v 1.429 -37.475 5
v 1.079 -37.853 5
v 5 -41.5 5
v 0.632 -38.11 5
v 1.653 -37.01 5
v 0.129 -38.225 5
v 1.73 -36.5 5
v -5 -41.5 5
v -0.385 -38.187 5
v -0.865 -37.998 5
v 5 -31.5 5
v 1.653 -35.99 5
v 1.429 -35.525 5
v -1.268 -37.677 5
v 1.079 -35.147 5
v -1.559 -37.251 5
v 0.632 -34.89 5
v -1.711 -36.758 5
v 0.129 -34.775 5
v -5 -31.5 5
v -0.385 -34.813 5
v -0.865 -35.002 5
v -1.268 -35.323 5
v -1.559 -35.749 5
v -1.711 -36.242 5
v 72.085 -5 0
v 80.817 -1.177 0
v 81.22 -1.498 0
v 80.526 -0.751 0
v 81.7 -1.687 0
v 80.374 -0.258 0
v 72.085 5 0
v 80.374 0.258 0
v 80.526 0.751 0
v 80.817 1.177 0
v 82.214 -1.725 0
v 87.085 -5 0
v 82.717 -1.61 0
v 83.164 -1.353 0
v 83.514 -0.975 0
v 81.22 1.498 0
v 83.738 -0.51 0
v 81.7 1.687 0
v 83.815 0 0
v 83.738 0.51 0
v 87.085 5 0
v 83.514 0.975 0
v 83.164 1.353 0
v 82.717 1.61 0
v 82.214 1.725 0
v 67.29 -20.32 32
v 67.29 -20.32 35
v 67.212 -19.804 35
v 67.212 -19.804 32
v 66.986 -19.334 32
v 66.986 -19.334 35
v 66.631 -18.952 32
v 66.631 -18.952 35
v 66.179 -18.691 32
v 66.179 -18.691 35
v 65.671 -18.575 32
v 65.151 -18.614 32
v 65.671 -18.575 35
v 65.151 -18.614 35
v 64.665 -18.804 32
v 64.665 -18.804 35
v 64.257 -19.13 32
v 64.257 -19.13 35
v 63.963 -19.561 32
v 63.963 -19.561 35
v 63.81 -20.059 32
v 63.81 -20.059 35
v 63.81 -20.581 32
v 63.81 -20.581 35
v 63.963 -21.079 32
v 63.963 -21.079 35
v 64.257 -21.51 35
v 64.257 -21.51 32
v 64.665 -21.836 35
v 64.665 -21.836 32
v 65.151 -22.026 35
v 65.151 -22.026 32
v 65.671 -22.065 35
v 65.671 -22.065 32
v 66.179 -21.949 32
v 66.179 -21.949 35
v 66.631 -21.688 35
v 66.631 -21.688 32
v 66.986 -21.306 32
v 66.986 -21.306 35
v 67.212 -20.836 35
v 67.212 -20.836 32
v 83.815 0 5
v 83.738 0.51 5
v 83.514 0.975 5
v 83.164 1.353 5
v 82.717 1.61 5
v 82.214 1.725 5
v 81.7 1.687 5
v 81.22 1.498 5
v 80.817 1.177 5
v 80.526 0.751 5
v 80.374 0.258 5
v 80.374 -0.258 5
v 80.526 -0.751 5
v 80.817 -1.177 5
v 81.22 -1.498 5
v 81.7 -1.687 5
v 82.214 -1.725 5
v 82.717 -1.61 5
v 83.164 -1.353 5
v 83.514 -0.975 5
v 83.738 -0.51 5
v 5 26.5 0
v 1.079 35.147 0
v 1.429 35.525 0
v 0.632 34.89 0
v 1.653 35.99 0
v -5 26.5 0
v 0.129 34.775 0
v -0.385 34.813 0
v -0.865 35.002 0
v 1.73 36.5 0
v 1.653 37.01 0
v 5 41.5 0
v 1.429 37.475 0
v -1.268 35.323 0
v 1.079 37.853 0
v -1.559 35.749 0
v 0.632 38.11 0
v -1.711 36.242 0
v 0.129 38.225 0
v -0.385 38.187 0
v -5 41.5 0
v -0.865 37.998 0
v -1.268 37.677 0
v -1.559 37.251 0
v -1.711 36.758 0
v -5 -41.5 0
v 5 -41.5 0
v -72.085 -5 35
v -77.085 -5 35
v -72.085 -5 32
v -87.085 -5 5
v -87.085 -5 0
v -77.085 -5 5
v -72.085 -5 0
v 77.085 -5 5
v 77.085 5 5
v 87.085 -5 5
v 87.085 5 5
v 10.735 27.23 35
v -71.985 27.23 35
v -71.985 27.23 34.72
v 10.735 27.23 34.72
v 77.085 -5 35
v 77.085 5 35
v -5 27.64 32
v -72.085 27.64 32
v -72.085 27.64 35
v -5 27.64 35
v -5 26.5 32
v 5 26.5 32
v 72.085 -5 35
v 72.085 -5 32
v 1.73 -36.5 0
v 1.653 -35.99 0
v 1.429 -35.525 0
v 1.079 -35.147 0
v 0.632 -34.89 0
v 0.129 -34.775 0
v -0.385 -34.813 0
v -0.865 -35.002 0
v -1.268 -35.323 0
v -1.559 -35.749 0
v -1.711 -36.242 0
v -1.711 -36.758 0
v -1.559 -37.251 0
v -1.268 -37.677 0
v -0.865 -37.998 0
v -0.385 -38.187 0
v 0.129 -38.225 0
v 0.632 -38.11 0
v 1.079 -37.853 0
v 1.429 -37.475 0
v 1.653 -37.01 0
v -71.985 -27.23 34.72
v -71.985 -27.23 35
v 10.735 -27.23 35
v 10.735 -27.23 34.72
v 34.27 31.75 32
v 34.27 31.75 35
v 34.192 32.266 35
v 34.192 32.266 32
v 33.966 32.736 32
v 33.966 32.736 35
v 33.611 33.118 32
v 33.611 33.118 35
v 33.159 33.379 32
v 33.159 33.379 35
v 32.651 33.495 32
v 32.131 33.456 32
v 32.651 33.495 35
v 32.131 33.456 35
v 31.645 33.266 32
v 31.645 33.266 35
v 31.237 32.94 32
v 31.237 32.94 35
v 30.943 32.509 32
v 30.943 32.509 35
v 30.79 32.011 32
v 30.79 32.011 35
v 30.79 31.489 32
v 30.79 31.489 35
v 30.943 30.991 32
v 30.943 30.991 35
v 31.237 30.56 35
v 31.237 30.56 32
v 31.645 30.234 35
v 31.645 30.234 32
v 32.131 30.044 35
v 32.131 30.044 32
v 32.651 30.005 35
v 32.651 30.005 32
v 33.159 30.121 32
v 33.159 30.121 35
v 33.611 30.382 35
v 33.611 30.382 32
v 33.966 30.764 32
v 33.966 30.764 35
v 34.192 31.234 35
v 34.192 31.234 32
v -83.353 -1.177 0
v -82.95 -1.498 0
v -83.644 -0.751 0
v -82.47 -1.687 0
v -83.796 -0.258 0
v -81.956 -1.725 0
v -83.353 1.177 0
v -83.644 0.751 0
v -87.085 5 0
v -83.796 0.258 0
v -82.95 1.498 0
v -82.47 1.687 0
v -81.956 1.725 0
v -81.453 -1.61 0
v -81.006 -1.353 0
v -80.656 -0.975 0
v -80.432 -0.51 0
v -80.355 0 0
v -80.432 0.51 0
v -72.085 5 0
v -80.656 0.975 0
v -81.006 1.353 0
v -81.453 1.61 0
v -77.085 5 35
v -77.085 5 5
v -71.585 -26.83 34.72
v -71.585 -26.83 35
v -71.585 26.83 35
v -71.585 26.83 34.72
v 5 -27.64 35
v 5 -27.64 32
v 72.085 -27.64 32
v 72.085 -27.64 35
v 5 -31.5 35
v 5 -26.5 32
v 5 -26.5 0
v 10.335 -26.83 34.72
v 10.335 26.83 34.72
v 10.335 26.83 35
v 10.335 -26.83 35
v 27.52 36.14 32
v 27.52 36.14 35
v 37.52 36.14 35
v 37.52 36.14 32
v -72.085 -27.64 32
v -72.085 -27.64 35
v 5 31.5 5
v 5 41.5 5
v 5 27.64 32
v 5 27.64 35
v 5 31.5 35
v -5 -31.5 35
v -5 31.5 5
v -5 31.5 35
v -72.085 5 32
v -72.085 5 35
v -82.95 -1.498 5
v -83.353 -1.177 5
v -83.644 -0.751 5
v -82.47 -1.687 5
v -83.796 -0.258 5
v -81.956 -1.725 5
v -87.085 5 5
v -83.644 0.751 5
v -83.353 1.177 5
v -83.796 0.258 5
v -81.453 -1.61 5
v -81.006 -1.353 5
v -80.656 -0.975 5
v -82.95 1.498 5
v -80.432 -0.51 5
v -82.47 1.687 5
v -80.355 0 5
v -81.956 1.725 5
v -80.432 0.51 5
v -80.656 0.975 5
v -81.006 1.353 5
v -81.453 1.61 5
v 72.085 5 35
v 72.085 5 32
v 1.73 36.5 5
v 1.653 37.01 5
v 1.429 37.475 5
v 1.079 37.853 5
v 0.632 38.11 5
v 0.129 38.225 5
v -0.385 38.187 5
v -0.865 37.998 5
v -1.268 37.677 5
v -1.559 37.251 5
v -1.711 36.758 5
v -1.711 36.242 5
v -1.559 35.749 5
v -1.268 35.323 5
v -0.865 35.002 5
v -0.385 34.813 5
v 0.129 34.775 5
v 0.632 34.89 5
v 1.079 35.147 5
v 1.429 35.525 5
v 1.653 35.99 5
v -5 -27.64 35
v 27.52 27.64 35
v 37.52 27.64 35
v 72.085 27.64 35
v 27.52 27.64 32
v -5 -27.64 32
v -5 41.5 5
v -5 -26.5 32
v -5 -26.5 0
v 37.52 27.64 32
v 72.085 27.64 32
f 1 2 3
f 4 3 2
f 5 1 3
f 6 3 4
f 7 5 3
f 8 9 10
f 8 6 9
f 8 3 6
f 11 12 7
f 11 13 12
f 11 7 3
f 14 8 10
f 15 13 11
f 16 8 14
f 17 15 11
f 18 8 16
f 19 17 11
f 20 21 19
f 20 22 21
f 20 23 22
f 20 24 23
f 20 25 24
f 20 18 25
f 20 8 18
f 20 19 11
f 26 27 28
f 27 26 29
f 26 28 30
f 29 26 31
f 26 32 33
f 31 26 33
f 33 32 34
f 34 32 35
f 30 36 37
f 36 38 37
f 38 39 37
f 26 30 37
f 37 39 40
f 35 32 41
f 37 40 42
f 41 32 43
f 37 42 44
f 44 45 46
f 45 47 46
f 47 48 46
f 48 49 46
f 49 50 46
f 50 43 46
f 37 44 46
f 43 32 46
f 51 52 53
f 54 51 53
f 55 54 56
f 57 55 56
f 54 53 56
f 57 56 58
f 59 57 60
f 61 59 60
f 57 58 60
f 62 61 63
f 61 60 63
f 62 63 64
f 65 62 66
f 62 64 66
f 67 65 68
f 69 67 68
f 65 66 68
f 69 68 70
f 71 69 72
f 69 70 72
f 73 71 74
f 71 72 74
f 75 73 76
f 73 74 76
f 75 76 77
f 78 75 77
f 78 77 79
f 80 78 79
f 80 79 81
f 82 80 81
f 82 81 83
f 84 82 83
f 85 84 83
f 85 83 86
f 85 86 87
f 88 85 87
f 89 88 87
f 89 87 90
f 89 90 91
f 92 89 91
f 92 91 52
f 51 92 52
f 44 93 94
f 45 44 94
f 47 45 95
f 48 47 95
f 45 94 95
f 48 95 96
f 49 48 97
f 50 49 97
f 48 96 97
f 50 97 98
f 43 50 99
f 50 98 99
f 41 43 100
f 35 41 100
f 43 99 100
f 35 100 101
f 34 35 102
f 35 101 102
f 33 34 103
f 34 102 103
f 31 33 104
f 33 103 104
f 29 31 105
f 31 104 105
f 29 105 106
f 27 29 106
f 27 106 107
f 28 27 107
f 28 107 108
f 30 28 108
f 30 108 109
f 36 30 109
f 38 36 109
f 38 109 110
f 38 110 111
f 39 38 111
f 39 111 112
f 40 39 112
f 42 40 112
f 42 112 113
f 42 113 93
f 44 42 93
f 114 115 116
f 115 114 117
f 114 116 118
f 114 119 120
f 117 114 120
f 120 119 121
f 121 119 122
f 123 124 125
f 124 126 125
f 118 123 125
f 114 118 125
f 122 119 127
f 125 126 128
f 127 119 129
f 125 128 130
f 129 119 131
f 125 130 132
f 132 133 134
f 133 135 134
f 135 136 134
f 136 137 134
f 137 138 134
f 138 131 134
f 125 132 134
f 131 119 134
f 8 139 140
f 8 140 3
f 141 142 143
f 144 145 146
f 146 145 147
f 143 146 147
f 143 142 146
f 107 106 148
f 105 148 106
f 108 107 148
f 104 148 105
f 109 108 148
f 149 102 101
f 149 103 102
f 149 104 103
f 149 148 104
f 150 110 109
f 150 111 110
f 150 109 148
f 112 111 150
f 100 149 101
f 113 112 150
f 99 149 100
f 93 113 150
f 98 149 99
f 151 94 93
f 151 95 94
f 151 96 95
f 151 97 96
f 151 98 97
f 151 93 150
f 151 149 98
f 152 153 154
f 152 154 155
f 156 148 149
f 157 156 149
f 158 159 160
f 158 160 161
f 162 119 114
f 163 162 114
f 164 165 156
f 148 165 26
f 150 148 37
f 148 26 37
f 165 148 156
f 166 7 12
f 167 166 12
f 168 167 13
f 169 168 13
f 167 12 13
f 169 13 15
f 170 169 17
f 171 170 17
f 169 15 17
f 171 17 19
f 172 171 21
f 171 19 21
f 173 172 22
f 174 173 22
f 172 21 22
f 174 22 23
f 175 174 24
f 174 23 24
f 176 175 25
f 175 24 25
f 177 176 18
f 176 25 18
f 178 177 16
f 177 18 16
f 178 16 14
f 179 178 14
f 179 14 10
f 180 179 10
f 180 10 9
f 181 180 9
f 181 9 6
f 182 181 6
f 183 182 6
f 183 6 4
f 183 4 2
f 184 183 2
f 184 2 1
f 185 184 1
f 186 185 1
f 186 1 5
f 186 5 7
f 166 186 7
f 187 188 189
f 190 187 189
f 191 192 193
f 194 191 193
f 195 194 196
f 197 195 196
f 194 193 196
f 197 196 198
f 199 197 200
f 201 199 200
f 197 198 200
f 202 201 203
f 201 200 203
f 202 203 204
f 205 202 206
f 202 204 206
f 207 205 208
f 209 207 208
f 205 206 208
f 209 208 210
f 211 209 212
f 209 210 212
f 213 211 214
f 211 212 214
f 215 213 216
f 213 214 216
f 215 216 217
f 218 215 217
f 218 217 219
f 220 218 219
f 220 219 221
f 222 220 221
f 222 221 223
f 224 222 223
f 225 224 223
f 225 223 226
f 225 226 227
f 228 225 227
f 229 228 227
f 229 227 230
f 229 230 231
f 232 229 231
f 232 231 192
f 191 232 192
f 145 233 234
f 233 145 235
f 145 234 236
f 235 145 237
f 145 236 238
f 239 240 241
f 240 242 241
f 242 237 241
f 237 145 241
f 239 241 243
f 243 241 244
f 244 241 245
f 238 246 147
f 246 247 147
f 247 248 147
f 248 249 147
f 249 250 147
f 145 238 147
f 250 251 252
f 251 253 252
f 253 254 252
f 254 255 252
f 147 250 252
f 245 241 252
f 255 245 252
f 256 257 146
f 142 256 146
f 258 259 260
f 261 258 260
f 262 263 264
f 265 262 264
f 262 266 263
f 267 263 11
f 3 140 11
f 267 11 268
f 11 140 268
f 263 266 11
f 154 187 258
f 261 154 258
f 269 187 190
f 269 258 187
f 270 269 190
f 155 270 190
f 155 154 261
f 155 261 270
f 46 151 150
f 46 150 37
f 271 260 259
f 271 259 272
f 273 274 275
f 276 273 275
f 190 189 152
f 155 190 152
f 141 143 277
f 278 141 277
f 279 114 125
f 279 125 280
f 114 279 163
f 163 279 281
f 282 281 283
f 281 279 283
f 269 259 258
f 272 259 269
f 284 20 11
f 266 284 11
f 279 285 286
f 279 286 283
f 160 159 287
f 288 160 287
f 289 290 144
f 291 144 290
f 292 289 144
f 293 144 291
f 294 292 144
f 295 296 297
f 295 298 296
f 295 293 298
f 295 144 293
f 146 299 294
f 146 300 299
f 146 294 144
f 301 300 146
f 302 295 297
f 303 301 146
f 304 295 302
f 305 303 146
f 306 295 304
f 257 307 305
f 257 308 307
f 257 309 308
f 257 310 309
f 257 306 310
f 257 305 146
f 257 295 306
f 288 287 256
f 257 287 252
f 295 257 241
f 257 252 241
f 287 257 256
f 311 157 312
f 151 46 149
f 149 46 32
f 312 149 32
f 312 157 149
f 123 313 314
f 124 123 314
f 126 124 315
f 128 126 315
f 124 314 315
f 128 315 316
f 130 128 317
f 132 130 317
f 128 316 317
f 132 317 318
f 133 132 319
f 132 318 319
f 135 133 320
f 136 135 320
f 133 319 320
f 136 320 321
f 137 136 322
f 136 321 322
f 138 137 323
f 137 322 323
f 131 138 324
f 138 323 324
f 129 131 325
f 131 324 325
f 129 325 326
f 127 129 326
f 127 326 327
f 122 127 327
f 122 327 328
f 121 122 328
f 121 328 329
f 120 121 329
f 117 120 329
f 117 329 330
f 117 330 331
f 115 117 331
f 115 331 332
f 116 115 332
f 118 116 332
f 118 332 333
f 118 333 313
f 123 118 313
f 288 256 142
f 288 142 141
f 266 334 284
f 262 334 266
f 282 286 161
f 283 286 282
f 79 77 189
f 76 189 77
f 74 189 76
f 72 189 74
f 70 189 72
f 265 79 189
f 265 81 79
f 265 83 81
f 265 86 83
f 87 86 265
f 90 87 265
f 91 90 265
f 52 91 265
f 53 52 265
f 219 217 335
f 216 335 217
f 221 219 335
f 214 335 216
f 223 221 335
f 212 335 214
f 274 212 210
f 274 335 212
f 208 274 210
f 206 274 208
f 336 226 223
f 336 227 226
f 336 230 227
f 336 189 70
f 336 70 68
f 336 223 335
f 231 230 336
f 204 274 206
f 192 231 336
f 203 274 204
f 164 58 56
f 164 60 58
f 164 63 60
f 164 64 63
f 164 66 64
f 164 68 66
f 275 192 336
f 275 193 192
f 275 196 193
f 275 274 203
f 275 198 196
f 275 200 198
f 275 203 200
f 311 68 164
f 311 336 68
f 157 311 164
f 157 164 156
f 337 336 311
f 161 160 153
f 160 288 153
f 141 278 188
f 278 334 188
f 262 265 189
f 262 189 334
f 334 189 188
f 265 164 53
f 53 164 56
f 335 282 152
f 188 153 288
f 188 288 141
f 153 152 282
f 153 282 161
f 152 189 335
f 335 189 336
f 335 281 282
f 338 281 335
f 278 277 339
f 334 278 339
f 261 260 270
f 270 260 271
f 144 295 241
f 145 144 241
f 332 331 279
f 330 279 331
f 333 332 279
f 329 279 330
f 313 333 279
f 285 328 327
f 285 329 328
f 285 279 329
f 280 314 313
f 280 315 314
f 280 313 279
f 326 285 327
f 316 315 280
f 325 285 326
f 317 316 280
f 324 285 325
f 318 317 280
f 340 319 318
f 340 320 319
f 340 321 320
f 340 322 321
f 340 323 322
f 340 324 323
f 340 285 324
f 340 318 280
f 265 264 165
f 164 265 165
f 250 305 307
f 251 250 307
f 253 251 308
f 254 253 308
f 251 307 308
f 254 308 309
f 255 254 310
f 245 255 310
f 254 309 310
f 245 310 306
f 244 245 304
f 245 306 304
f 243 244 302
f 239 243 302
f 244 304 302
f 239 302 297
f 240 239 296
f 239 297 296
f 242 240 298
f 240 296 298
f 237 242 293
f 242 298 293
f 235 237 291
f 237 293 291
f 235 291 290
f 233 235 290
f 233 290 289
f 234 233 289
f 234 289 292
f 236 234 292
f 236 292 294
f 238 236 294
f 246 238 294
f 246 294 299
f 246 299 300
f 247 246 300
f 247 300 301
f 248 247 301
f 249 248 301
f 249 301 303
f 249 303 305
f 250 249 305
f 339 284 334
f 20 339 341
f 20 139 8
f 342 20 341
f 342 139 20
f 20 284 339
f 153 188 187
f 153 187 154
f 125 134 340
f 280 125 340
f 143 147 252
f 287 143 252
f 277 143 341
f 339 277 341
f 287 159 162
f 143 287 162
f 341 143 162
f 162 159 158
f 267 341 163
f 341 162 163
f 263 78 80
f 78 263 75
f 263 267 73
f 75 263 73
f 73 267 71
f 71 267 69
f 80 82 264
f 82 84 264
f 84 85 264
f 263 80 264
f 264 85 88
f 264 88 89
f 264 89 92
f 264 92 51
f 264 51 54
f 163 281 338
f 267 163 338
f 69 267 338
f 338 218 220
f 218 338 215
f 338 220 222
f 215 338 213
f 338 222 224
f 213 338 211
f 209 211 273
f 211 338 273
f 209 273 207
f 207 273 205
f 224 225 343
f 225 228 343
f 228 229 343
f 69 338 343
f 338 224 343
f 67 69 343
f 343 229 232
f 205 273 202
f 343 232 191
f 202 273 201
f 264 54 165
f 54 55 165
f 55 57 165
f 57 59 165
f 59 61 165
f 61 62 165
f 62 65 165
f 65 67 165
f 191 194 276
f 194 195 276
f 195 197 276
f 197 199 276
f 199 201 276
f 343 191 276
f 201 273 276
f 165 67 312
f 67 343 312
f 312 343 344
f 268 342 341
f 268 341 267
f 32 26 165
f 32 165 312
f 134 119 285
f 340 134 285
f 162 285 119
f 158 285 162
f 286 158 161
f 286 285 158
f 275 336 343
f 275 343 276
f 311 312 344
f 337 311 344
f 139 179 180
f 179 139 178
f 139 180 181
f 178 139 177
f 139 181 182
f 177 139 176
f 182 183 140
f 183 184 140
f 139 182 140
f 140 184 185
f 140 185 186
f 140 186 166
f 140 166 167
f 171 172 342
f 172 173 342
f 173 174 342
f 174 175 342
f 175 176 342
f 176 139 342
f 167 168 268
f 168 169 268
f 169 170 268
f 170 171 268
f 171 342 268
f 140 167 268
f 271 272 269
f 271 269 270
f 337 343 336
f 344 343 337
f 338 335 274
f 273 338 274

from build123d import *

# Parameters (mm, degrees)
SKETCH2_W             = 5
SKETCH2_H             = 10
BOSS_EXTRUDE1_DEPTH   = 32
SKETCH2_W_2           = 10
SKETCH2_H_2           = 5
BOSS_EXTRUDE1_2_DEPTH = 32
BOSS_EXTRUDE1_3_DEPTH = 32
BOSS_EXTRUDE1_4_DEPTH = 32
SKETCH3_W             = 165
SKETCH3_H             = 55.28
BOSS_EXTRUDE2_DEPTH   = 3
SKETCH4_W             = 10
SKETCH4_H             = 3.86
BOSS_EXTRUDE3_DEPTH   = 3
SKETCH5_W             = 10
SKETCH5_H             = 5
BOSS_EXTRUDE4_DEPTH   = 10
SKETCH7_W             = 5
SKETCH7_H             = 10
BOSS_EXTRUDE5_DEPTH   = 10
SKETCH8_R             = 1.73
CUT_EXTRUDE1_DEPTH    = 6
SKETCH10_W            = 10
SKETCH10_H            = 8.5
SKETCH10_W_2          = 1.85
SKETCH10_H_2          = 10
BOSS_EXTRUDE6_DEPTH   = 3
SKETCH11_R            = 1.75
CUT_EXTRUDE3_DEPTH    = 36
SKETCH12_W            = 82.72
SKETCH12_H            = 54.46
SKETCH12_W_2          = 81.92
SKETCH12_H_2          = 53.66
CUT_EXTRUDE4_DEPTH    = 0.28
CUT_EXTRUDE5_DEPTH    = 4


with BuildPart() as part:
    # Sketch2 → Boss-Extrude1 (new body)
    with BuildSketch(Plane.XY):
        with Locations((-74.585, 0)):
            Rectangle(SKETCH2_W, SKETCH2_H)
    extrude(amount=BOSS_EXTRUDE1_DEPTH)



with BuildPart() as body_2:
    # Sketch2 → Boss-Extrude1 2 (new body)
    with BuildSketch(Plane.XY):
        with Locations((0, 29)):
            Rectangle(SKETCH2_W_2, SKETCH2_H_2)
    extrude(amount=BOSS_EXTRUDE1_2_DEPTH)


with BuildPart() as body_3:
    # Sketch2 → Boss-Extrude1 3 (new body)
    with BuildSketch(Plane.XY):
        with Locations((74.585, 0)):
            Rectangle(SKETCH2_W, SKETCH2_H)
    extrude(amount=BOSS_EXTRUDE1_3_DEPTH)


with BuildPart() as body_4:
    # Sketch2 → Boss-Extrude1 4 (new body)
    with BuildSketch(Plane.XY):
        with Locations((0, -29)):
            Rectangle(SKETCH2_W_2, SKETCH2_H_2)
    extrude(amount=BOSS_EXTRUDE1_4_DEPTH)


with BuildPart() as part_1:
    add(part.part)

    add(body_2.part)  # Boss-Extrude2 merges body 2

    add(body_3.part)  # Boss-Extrude2 merges body 3

    add(body_4.part)  # Boss-Extrude2 merges body 4
    # Sketch3 → Boss-Extrude2 (add)
    with BuildSketch(Plane.XY.offset(32)):
        Rectangle(SKETCH3_W, SKETCH3_H)
    extrude(amount=BOSS_EXTRUDE2_DEPTH)

    # Sketch4 → Boss-Extrude3 (add)
    with BuildSketch(Plane.XY.offset(32)):
        with Locations((0, 29.57)):
            Rectangle(SKETCH4_W, SKETCH4_H)
        with Locations((0, -29.57)):
            Rectangle(SKETCH4_W, SKETCH4_H)
    extrude(amount=BOSS_EXTRUDE3_DEPTH)

    # Sketch5 → Boss-Extrude4 (add)
    with BuildSketch(Plane(origin=(0, 5, 0), x_dir=(1, 0, 0), z_dir=(0, 1, 0))):
        with Locations((-82.085, -2.5)):
            Rectangle(SKETCH5_W, SKETCH5_H)
        with Locations((82.085, -2.5)):
            Rectangle(SKETCH5_W, SKETCH5_H)
    extrude(amount=-BOSS_EXTRUDE4_DEPTH)

    # Sketch7 → Boss-Extrude5 (add)
    with BuildSketch(Plane.ZY.offset(5)):
        with Locations((2.5, 36.5)):
            Rectangle(SKETCH7_W, SKETCH7_H)
        with Locations((2.5, -36.5)):
            Rectangle(SKETCH7_W, SKETCH7_H)
    extrude(amount=-BOSS_EXTRUDE5_DEPTH)

    # Sketch8 → Cut-Extrude1 (cut, through all)
    with BuildSketch(Plane.XY.offset(5)):
        with Locations((-82.085, 0)):
            Circle(SKETCH8_R)
        with Locations((0, -36.5)):
            Circle(SKETCH8_R)
        with Locations((82.085, 0)):
            Circle(SKETCH8_R)
        with Locations((0, 36.5)):
            Circle(SKETCH8_R)
    extrude(amount=-CUT_EXTRUDE1_DEPTH, mode=Mode.SUBTRACT)

    # Sketch10 → Boss-Extrude6 (add)
    with BuildSketch(Plane.XY.offset(35)):
        with Locations((32.52, 31.89)):
            Rectangle(SKETCH10_W, SKETCH10_H)
        with Locations((69.005, -20.32)):
            Rectangle(SKETCH10_W_2, SKETCH10_H_2)
    extrude(amount=-BOSS_EXTRUDE6_DEPTH)

    # Sketch11 → Cut-Extrude3 (cut, through all)
    with BuildSketch(Plane.XY.offset(35)):
        with Locations((32.52, 31.75)):
            Circle(SKETCH11_R)
        with Locations((65.54, -20.32)):
            Circle(SKETCH11_R)
    extrude(amount=-CUT_EXTRUDE3_DEPTH, mode=Mode.SUBTRACT)

    # Sketch12 → Cut-Extrude4 (cut)
    with BuildSketch(Plane.XY.offset(35)):
        with Locations((-30.625, 0)):
            Rectangle(SKETCH12_W, SKETCH12_H)
        with Locations((-30.625, 0)):
            Rectangle(SKETCH12_W_2, SKETCH12_H_2, mode=Mode.SUBTRACT)
    extrude(amount=-CUT_EXTRUDE4_DEPTH, mode=Mode.SUBTRACT)

    # Sketch13 → Cut-Extrude5 (cut, through all)
    with BuildSketch(Plane(origin=(0, 0, 32), x_dir=(-1, 0, 0), z_dir=(0, 0, -1))):
        Polygon((82.5, -27.64), (82.5, 27.64), (72.085, 27.64), (72.085, 5), (77.085, 5), (77.085, -5), (72.085, -5), (72.085, -27.64), align=None)
        Polygon((-82.5, 27.64), (-82.5, -27.64), (-72.085, -27.64), (-72.085, -5), (-77.085, -5), (-77.085, 5), (-72.085, 5), (-72.085, 27.64), align=None)
    extrude(amount=-CUT_EXTRUDE5_DEPTH, mode=Mode.SUBTRACT)


solid = part_1.part
